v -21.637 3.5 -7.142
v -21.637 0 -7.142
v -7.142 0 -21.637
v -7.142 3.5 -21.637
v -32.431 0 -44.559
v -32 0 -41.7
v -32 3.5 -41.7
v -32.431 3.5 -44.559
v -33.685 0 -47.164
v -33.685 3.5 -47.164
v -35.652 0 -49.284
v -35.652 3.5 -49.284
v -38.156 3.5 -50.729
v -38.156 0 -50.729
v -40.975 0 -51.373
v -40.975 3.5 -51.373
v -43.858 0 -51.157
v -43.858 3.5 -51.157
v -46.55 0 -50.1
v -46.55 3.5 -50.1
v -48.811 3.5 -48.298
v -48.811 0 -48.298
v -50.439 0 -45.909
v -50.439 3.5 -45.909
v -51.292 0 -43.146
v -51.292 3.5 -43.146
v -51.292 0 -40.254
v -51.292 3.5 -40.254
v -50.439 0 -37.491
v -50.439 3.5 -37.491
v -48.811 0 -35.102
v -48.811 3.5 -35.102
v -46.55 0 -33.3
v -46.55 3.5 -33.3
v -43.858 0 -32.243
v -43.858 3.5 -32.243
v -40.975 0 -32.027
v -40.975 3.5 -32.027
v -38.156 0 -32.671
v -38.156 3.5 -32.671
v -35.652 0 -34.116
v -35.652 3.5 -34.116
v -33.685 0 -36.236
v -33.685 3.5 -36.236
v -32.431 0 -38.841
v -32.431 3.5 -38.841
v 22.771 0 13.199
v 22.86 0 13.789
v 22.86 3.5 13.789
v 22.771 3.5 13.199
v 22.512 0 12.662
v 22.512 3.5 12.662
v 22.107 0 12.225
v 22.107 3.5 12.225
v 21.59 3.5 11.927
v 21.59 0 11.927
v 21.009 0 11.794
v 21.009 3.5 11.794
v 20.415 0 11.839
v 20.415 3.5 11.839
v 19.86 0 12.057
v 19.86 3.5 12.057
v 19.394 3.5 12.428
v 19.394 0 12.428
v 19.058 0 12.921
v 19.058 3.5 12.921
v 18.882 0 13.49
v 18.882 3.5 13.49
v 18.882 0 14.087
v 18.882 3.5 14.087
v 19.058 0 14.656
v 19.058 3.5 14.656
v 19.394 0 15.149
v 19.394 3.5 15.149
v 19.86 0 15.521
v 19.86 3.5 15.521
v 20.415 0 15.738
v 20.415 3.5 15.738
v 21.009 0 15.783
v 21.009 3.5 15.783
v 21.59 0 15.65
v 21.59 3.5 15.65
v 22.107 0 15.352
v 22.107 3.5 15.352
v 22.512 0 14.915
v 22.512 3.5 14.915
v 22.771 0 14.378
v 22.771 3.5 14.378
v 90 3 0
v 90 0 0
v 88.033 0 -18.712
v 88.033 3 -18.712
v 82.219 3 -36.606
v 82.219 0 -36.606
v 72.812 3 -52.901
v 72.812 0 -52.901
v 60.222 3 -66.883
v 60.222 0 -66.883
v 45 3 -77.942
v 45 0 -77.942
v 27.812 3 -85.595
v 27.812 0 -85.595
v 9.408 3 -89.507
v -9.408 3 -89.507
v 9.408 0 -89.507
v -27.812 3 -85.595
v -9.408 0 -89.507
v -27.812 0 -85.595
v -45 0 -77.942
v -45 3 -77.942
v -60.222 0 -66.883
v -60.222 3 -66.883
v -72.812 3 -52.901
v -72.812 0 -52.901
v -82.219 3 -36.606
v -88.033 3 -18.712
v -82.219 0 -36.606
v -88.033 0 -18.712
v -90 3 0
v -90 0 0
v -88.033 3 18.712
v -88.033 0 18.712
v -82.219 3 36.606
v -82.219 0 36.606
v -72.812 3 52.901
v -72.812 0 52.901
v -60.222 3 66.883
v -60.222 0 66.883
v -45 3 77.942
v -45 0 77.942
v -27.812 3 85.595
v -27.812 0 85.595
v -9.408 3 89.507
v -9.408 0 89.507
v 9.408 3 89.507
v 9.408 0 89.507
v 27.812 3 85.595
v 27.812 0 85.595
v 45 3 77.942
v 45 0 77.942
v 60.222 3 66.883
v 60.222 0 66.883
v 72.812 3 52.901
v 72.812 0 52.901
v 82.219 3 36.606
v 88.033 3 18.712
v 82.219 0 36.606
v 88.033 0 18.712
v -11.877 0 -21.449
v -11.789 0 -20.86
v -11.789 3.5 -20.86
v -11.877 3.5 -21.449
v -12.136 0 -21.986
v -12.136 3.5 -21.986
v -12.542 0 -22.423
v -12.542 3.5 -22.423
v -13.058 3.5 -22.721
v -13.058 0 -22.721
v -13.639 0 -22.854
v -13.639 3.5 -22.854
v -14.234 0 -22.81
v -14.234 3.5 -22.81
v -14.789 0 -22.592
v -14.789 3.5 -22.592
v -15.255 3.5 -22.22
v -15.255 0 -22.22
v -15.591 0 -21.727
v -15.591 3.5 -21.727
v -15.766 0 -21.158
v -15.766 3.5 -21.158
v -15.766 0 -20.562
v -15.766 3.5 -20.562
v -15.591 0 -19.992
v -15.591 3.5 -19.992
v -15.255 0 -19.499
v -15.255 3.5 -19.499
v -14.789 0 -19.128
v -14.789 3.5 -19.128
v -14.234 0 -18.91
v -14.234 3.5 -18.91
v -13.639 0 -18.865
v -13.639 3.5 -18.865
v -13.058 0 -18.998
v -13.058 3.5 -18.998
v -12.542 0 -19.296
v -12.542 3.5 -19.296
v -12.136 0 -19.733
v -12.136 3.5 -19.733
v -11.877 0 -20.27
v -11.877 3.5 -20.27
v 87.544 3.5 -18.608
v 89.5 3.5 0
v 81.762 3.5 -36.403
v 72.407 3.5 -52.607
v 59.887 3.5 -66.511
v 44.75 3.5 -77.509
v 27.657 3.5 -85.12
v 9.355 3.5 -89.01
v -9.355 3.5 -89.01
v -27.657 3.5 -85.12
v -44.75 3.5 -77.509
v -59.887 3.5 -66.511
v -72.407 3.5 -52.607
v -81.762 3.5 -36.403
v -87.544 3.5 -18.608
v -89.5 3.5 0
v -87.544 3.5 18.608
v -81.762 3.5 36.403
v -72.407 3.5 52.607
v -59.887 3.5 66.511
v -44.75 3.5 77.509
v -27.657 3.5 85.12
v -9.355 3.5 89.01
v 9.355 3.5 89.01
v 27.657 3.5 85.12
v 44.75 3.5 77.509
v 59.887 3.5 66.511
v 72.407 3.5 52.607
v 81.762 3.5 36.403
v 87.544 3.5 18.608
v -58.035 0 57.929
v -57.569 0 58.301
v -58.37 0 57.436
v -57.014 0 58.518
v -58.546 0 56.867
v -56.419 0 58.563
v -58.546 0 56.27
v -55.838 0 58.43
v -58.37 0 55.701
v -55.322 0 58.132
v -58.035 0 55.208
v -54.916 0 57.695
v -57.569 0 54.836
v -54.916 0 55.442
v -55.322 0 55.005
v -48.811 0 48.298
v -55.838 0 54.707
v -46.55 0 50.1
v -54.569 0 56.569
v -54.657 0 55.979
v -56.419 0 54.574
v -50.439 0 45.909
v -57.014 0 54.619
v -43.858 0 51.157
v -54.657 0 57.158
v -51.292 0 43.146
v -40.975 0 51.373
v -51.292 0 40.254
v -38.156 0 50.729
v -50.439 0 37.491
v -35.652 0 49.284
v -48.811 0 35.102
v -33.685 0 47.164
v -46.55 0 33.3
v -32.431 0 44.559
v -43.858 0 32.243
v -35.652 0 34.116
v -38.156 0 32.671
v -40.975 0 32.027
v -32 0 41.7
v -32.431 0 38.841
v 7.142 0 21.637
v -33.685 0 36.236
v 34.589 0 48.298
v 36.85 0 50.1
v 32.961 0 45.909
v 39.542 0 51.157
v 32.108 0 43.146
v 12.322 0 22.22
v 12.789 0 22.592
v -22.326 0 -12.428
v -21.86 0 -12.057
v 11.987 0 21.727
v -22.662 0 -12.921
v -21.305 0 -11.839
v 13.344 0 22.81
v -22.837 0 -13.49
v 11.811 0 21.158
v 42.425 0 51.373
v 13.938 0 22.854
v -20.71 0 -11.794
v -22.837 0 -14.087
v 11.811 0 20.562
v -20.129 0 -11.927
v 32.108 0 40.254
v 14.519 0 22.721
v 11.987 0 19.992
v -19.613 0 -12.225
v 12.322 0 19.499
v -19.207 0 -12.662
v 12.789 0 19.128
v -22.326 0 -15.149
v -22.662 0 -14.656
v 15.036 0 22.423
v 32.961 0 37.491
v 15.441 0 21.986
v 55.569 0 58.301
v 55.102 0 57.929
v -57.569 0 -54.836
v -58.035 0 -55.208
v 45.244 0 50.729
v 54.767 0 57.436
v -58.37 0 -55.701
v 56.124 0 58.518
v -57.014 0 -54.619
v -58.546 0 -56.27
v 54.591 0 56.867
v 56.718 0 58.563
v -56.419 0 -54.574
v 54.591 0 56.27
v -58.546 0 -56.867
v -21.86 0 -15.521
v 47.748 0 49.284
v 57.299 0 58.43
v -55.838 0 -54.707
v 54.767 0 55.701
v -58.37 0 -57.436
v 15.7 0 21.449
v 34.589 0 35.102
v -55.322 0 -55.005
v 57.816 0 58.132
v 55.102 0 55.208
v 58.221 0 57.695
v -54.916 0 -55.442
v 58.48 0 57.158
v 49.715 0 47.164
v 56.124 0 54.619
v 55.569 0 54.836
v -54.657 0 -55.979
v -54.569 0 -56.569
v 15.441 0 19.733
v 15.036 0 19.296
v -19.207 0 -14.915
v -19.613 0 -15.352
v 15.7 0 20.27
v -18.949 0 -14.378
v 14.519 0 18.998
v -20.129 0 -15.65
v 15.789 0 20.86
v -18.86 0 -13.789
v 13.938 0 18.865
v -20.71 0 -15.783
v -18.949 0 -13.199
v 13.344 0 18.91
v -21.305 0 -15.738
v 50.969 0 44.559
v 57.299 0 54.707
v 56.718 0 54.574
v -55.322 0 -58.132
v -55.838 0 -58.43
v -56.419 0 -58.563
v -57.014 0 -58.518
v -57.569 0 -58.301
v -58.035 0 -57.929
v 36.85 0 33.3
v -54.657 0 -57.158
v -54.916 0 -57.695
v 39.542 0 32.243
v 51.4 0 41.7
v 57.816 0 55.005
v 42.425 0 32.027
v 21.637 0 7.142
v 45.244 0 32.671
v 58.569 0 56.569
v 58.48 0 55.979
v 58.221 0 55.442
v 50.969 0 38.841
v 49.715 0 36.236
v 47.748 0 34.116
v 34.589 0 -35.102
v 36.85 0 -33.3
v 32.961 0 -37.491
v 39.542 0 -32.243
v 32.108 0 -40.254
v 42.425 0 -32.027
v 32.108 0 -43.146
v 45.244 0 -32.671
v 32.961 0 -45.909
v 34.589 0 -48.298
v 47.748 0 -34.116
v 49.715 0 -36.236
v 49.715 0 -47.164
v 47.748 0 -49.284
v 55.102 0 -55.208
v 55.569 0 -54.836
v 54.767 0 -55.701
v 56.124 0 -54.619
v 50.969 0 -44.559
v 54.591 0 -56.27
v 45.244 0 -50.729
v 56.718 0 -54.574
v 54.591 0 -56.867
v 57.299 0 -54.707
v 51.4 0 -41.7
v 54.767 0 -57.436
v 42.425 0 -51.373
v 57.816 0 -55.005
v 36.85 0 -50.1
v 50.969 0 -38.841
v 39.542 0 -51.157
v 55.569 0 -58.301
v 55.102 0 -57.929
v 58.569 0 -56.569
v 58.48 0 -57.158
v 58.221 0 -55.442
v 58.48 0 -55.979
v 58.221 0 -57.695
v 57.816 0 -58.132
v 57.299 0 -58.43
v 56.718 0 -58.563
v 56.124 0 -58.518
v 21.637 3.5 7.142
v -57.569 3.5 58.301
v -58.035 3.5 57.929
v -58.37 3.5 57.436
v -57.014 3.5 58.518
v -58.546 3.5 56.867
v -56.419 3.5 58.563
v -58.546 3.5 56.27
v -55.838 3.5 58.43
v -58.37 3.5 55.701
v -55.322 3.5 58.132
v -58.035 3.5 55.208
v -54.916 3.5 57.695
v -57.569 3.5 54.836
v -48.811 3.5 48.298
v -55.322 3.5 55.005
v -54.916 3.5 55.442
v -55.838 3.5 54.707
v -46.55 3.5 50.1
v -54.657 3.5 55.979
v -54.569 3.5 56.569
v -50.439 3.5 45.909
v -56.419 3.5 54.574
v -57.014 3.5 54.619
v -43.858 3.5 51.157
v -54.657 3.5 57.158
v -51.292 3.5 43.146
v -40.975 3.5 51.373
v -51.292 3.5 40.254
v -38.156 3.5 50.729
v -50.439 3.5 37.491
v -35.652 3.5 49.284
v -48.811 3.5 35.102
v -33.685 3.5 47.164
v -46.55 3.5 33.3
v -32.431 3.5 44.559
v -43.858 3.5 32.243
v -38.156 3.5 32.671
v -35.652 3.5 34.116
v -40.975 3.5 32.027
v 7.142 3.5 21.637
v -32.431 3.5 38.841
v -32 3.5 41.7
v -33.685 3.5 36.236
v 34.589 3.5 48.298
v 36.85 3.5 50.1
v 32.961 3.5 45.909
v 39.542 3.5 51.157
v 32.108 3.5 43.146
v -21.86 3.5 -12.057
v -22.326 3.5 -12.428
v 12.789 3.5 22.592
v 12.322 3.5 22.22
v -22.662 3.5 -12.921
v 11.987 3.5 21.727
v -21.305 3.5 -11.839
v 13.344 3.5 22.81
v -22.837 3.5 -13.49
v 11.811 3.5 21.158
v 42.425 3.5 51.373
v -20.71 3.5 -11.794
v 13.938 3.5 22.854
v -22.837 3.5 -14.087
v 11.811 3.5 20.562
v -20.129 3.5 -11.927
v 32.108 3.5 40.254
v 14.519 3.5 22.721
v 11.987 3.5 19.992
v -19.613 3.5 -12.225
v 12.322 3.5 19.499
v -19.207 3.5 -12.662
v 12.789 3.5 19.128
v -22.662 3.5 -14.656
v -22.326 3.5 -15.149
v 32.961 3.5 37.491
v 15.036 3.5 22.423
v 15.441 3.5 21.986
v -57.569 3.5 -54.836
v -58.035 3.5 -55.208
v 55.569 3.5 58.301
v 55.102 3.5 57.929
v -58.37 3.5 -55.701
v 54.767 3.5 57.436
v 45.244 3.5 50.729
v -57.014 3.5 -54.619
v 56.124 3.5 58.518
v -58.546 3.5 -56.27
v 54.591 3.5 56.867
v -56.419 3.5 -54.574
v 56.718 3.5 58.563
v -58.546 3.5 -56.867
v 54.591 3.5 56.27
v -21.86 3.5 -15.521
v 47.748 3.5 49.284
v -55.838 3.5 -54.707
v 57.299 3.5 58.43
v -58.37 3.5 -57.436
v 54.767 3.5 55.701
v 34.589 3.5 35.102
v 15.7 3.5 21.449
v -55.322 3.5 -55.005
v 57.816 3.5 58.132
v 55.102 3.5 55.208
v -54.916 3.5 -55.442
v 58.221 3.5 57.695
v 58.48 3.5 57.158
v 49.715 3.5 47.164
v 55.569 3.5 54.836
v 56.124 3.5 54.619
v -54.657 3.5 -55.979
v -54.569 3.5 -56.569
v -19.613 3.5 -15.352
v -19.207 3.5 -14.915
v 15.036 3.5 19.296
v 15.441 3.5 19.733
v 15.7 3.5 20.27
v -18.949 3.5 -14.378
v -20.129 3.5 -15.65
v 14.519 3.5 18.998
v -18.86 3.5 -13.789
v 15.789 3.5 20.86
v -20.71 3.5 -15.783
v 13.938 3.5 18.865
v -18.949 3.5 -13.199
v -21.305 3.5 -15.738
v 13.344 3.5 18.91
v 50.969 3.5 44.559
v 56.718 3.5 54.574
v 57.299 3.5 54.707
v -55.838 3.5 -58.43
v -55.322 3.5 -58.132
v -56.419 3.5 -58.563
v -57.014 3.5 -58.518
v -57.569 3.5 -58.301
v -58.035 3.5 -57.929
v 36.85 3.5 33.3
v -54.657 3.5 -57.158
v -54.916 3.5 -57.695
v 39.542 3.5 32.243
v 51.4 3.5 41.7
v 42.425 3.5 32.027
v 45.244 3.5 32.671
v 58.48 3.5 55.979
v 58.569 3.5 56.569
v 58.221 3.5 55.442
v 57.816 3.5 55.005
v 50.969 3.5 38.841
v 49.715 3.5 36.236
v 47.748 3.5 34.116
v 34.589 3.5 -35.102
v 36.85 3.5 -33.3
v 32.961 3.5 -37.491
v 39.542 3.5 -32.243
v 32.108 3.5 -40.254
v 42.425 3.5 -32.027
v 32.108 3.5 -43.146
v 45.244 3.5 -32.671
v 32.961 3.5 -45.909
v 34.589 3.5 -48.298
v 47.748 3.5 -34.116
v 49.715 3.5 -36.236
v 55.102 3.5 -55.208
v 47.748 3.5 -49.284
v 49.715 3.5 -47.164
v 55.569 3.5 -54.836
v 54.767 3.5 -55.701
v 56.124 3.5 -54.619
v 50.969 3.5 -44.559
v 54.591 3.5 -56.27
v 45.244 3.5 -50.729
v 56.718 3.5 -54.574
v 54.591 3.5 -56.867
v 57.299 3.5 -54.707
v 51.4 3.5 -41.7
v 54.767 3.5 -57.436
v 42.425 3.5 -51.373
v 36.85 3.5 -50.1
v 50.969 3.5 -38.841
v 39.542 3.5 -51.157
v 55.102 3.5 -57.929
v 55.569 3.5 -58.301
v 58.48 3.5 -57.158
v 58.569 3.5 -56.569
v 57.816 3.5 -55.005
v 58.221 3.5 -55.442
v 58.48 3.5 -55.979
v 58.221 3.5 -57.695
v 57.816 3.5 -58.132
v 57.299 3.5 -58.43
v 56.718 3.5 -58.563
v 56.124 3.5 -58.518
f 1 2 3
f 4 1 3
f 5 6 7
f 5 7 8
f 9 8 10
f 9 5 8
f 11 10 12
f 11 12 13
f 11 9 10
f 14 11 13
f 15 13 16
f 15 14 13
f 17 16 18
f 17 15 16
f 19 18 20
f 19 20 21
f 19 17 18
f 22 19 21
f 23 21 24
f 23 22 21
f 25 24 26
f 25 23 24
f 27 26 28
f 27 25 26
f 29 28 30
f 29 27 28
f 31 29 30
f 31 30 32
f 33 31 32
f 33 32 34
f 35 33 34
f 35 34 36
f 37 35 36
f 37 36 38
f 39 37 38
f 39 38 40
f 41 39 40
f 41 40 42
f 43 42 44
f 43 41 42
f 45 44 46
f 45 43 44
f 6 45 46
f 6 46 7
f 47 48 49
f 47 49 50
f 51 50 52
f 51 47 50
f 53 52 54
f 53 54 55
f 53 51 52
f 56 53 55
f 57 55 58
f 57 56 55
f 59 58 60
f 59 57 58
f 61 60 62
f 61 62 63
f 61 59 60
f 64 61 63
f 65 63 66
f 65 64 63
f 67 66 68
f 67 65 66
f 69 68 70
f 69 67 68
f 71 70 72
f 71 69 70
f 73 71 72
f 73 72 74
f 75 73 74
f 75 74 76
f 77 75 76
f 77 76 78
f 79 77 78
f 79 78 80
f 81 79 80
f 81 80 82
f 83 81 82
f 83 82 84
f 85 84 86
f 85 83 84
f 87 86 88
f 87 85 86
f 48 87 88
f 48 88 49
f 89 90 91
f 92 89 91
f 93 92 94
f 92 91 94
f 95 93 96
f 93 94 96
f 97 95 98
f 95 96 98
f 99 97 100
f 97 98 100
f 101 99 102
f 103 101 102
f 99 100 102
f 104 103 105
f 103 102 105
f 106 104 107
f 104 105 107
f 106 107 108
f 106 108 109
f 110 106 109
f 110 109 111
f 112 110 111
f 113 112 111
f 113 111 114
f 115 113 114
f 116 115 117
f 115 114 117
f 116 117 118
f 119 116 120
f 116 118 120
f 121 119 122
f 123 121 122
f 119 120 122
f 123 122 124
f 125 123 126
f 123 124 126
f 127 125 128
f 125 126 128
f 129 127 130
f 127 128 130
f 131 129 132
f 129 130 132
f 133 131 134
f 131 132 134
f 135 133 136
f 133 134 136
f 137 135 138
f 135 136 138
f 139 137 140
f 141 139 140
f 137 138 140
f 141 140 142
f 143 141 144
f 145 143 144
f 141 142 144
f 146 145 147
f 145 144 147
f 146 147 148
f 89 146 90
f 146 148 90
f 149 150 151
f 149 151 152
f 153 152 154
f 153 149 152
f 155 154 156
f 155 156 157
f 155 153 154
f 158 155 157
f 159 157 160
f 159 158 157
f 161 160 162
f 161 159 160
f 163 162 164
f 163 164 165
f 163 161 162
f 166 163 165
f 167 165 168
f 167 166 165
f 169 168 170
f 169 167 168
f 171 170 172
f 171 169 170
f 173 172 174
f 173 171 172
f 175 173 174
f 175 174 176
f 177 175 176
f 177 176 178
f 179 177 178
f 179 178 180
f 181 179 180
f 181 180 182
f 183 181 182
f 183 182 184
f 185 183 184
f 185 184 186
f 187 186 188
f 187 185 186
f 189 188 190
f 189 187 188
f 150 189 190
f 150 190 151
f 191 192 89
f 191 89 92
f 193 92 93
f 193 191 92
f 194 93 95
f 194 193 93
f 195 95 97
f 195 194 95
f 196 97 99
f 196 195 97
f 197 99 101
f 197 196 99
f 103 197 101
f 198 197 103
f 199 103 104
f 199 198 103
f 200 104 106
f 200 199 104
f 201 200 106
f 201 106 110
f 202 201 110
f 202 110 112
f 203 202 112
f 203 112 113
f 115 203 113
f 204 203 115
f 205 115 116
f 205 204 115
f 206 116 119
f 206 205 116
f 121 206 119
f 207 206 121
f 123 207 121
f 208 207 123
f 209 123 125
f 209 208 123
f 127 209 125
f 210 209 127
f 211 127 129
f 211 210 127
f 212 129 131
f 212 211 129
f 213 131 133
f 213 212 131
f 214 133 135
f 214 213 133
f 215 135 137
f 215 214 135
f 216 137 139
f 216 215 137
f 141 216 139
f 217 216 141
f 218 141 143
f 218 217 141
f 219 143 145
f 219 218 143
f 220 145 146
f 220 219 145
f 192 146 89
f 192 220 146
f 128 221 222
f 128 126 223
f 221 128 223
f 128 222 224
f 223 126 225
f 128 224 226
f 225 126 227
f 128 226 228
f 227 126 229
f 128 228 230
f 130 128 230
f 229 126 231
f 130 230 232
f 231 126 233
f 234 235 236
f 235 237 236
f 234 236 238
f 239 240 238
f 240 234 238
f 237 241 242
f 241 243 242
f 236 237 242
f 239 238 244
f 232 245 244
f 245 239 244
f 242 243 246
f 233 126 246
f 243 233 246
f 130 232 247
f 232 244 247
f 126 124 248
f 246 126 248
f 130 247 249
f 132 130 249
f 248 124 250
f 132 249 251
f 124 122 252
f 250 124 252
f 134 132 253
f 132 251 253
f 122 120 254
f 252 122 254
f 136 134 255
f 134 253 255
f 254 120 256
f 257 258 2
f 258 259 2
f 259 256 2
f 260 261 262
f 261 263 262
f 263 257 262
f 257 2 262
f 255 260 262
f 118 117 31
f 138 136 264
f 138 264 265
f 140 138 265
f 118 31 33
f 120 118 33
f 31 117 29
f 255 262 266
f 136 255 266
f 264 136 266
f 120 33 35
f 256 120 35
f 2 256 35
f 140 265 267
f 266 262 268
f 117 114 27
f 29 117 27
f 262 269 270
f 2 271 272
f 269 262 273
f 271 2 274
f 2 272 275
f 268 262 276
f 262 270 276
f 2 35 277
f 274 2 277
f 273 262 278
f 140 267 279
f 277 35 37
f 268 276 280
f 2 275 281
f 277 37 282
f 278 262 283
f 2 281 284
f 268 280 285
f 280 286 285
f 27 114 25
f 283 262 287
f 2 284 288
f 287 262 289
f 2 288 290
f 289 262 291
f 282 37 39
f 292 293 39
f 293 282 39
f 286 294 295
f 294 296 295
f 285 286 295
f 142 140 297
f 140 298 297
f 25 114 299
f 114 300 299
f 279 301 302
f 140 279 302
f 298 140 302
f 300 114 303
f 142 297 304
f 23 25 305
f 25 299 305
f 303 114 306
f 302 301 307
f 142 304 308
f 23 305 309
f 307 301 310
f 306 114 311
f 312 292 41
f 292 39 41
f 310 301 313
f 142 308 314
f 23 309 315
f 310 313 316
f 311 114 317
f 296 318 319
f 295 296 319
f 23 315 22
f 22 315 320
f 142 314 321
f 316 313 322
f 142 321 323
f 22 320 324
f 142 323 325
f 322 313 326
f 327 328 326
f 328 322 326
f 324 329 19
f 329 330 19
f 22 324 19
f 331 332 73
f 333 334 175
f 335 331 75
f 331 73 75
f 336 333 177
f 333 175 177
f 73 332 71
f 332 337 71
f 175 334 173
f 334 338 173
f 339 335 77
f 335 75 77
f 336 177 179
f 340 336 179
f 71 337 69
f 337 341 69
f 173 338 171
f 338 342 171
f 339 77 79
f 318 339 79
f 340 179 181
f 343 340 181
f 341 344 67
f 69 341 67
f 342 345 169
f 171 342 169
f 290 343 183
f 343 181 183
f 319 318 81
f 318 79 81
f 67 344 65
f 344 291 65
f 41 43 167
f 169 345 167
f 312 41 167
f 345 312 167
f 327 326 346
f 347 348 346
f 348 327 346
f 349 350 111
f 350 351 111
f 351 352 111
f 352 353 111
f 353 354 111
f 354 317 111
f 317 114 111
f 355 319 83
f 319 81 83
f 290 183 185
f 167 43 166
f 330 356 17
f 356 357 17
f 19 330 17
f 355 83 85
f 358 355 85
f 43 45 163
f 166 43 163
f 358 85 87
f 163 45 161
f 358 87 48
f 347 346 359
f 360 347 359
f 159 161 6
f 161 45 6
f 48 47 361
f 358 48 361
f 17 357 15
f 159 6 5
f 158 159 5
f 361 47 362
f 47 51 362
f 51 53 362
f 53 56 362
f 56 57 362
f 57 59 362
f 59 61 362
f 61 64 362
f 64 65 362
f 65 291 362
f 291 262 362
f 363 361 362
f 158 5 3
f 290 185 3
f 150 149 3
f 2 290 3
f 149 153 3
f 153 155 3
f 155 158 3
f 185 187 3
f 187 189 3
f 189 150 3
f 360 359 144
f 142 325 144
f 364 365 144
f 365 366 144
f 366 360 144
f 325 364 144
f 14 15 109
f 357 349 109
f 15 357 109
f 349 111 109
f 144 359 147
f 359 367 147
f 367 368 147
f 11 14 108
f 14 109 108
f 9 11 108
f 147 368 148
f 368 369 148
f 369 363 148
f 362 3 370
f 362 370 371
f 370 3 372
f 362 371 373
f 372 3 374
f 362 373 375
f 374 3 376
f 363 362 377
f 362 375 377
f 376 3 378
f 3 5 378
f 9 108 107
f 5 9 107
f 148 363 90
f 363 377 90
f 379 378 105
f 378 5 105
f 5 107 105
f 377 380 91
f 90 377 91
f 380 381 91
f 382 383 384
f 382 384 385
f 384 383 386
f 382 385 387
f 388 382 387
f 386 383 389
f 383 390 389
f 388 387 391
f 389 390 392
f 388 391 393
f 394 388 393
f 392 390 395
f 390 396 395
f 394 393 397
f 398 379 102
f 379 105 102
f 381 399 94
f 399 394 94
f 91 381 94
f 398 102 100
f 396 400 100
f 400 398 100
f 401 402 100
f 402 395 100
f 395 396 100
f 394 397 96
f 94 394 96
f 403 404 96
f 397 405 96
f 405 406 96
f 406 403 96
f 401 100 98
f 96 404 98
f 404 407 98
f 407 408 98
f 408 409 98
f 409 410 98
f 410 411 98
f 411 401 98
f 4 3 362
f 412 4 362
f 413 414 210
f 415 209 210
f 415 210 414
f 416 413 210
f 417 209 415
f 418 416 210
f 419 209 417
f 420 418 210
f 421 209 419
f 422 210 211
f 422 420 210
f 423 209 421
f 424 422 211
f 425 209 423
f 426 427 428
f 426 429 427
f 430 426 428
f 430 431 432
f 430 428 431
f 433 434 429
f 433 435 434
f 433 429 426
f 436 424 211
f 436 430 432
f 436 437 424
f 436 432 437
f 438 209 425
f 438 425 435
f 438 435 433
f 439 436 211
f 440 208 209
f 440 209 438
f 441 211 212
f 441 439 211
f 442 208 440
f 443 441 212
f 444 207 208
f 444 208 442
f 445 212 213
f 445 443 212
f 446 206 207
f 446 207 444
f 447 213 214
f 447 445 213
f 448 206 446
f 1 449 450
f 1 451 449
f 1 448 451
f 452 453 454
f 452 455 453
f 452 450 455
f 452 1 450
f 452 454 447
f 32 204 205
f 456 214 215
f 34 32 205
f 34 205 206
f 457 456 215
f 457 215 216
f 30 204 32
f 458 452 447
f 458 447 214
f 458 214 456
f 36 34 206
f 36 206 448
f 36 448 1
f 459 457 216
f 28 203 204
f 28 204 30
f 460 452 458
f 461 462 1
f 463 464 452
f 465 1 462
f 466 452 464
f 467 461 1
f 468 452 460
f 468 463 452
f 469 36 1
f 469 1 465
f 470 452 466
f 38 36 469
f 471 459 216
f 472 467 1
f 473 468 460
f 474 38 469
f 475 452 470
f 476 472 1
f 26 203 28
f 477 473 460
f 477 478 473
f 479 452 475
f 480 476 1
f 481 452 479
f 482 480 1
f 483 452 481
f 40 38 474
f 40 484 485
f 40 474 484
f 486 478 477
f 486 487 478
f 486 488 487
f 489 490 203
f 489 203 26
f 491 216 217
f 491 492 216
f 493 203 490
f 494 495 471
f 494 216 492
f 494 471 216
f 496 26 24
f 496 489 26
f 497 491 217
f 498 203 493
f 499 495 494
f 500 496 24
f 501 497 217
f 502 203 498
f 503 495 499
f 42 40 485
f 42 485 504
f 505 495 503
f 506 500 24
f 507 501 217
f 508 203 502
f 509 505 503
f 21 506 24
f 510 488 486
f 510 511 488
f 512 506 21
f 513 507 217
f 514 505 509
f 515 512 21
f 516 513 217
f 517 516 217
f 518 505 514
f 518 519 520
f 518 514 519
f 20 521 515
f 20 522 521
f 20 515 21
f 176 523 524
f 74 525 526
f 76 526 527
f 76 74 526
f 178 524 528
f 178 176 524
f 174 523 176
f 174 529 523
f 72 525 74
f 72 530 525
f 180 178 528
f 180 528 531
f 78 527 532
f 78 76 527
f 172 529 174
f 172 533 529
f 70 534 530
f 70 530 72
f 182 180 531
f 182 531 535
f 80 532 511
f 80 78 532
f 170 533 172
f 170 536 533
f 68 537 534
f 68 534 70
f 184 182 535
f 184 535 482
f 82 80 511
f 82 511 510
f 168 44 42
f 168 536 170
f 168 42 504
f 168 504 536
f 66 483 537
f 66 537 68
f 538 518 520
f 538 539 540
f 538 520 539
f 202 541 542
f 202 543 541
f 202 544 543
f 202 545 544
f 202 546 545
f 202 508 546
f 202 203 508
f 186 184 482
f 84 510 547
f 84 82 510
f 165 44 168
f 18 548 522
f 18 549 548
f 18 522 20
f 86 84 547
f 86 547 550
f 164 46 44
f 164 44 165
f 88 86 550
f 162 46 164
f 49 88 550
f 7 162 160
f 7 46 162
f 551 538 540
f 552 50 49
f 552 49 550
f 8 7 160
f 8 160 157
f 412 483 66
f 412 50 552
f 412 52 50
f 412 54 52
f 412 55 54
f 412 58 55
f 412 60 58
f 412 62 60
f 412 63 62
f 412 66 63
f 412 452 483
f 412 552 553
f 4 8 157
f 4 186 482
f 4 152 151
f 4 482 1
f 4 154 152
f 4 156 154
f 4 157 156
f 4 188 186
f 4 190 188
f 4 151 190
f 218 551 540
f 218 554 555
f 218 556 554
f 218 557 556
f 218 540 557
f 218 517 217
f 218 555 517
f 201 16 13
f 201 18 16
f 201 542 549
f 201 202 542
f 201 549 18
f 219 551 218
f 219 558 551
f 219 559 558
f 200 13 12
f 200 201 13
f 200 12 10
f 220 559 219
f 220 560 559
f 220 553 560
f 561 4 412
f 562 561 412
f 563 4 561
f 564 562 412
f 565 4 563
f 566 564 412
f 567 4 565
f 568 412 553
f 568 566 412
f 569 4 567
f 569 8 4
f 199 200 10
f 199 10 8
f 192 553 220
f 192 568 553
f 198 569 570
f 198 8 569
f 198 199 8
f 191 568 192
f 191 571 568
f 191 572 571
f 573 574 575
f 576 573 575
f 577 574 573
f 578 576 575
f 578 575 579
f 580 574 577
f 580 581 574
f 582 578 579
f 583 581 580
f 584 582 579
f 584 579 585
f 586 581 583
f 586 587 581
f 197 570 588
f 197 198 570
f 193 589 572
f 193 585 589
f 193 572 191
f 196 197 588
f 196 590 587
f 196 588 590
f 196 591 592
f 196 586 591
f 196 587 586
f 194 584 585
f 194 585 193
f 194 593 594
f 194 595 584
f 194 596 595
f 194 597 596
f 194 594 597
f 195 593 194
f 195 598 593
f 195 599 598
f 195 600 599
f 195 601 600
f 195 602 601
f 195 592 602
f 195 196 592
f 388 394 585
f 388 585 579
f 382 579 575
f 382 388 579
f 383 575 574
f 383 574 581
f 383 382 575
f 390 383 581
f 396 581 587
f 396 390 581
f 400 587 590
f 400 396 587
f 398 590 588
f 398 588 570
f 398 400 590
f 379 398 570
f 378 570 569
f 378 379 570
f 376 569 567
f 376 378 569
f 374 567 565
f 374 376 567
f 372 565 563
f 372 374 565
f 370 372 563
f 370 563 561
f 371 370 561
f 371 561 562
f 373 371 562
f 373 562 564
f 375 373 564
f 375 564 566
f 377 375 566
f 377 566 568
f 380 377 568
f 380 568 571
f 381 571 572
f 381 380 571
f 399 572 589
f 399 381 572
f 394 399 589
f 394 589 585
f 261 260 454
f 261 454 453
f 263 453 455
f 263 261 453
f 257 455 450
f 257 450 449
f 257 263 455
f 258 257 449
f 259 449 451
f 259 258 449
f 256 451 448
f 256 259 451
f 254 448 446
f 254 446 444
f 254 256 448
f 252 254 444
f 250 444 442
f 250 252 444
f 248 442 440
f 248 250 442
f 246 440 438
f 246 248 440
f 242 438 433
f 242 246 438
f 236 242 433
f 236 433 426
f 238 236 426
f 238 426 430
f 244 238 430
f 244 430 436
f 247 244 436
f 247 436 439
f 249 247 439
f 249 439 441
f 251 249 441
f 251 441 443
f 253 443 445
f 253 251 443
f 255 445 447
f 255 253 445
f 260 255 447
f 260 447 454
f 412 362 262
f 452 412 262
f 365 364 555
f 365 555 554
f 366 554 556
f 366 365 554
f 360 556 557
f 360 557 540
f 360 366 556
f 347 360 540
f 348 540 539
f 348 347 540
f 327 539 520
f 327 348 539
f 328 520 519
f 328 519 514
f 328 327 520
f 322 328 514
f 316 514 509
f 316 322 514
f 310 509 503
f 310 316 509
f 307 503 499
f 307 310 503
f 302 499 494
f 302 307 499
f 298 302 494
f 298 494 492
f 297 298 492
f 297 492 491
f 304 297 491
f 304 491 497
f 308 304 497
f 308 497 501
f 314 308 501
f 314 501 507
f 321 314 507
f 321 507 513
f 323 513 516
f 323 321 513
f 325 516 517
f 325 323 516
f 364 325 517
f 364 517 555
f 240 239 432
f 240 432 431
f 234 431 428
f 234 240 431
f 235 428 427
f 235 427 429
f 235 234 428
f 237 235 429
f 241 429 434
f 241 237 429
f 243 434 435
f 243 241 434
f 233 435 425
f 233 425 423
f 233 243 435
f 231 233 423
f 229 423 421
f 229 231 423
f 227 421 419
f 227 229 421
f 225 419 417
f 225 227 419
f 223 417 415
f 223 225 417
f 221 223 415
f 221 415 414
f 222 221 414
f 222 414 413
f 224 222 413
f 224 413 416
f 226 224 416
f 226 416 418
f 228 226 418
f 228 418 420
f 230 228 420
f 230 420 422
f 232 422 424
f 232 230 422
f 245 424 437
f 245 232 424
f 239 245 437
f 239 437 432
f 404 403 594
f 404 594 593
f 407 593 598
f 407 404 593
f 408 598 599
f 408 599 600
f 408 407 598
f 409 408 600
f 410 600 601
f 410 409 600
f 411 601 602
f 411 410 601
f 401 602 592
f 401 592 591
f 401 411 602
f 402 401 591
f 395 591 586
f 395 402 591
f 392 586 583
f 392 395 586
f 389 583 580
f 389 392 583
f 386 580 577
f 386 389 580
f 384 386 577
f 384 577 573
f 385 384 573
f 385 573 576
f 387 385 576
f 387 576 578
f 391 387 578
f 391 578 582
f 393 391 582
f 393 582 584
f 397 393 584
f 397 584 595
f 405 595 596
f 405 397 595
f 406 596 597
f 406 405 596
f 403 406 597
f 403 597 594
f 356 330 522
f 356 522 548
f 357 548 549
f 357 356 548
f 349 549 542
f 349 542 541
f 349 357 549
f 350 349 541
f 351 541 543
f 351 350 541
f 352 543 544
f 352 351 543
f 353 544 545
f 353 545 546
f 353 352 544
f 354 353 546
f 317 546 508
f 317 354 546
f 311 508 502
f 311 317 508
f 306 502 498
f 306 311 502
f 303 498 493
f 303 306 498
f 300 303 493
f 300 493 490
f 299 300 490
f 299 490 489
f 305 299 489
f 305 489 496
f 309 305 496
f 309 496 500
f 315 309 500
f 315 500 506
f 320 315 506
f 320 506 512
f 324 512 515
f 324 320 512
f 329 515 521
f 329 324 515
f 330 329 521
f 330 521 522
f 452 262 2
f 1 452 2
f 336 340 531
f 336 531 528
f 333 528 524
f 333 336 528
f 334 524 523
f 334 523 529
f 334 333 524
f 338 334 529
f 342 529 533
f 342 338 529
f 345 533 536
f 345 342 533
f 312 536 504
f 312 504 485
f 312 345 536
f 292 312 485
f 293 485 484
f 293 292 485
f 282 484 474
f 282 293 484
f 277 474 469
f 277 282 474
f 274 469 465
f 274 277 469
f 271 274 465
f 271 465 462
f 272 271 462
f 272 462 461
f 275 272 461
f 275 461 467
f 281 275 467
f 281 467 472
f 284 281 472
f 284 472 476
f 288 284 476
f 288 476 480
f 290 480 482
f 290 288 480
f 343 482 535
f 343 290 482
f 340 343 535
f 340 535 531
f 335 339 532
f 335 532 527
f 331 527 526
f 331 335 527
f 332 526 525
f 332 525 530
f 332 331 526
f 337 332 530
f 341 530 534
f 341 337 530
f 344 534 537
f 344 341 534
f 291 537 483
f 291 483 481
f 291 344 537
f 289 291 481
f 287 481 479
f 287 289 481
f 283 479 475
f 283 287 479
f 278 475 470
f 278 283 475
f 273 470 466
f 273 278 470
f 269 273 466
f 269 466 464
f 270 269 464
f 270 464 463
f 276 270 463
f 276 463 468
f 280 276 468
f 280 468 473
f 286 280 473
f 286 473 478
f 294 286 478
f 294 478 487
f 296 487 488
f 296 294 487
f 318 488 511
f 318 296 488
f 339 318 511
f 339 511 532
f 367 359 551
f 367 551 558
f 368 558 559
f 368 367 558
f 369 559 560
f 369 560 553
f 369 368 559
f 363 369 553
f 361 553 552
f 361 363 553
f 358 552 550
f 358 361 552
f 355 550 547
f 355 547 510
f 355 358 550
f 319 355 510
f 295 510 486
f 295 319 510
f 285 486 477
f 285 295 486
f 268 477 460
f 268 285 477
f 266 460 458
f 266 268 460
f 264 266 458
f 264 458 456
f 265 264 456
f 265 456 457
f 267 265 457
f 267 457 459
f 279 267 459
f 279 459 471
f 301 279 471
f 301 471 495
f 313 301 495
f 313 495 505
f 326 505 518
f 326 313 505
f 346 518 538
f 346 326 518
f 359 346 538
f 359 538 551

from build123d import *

# Parameters (mm, degrees)
SKETCH1_R           = 90
SKETCH1_R_2         = 9.7
SKETCH1_R_3         = 2
BOSS_EXTRUDE1_DEPTH = 3.5
CHAMFER1_SIZE       = 0.5


with BuildPart() as part:
    # Sketch1 → Boss-Extrude1 (new body)
    with BuildSketch(Plane(origin=(0, 0, 0), x_dir=(1, 0, 0), z_dir=(0, 1, 0))):
        Circle(SKETCH1_R)
        with Locations((-41.7, 41.7)):
            Circle(SKETCH1_R_2, mode=Mode.SUBTRACT)
        with Locations((41.7, 41.7)):
            Circle(SKETCH1_R_2, mode=Mode.SUBTRACT)
        with Locations((41.7, -41.7)):
            Circle(SKETCH1_R_2, mode=Mode.SUBTRACT)
        with Locations((-41.7, -41.7)):
            Circle(SKETCH1_R_2, mode=Mode.SUBTRACT)
        with Locations((-56.568542495, 56.568542495)):
            Circle(SKETCH1_R_3, mode=Mode.SUBTRACT)
        with Locations((-56.568542495, -56.568542495)):
            Circle(SKETCH1_R_3, mode=Mode.SUBTRACT)
        with Locations((56.568542495, 56.568542495)):
            Circle(SKETCH1_R_3, mode=Mode.SUBTRACT)
        with Locations((56.568542495, -56.568542495)):
            Circle(SKETCH1_R_3, mode=Mode.SUBTRACT)
        with Locations((-13.788582233, 20.859650045)):
            Circle(SKETCH1_R_3, mode=Mode.SUBTRACT)
        with Locations((20.859650045, -13.788582233)):
            Circle(SKETCH1_R_3, mode=Mode.SUBTRACT)
        with Locations((13.788582233, -20.859650045)):
            Circle(SKETCH1_R_3, mode=Mode.SUBTRACT)
        with Locations((-20.859650045, 13.788582233)):
            Circle(SKETCH1_R_3, mode=Mode.SUBTRACT)
        Polygon((7.14177849, -21.637467504), (-21.637467504, 7.14177849), (-7.14177849, 21.637467504), (21.637467504, -7.14177849), align=None, mode=Mode.SUBTRACT)
    extrude(amount=BOSS_EXTRUDE1_DEPTH)

    # Chamfer1
    chamfer1_edges = [part.edges().sort_by_distance(p)[0] for p in [
        (-90, 3.5, 0),
    ]]
    chamfer(chamfer1_edges, length=CHAMFER1_SIZE)


solid = part.part
